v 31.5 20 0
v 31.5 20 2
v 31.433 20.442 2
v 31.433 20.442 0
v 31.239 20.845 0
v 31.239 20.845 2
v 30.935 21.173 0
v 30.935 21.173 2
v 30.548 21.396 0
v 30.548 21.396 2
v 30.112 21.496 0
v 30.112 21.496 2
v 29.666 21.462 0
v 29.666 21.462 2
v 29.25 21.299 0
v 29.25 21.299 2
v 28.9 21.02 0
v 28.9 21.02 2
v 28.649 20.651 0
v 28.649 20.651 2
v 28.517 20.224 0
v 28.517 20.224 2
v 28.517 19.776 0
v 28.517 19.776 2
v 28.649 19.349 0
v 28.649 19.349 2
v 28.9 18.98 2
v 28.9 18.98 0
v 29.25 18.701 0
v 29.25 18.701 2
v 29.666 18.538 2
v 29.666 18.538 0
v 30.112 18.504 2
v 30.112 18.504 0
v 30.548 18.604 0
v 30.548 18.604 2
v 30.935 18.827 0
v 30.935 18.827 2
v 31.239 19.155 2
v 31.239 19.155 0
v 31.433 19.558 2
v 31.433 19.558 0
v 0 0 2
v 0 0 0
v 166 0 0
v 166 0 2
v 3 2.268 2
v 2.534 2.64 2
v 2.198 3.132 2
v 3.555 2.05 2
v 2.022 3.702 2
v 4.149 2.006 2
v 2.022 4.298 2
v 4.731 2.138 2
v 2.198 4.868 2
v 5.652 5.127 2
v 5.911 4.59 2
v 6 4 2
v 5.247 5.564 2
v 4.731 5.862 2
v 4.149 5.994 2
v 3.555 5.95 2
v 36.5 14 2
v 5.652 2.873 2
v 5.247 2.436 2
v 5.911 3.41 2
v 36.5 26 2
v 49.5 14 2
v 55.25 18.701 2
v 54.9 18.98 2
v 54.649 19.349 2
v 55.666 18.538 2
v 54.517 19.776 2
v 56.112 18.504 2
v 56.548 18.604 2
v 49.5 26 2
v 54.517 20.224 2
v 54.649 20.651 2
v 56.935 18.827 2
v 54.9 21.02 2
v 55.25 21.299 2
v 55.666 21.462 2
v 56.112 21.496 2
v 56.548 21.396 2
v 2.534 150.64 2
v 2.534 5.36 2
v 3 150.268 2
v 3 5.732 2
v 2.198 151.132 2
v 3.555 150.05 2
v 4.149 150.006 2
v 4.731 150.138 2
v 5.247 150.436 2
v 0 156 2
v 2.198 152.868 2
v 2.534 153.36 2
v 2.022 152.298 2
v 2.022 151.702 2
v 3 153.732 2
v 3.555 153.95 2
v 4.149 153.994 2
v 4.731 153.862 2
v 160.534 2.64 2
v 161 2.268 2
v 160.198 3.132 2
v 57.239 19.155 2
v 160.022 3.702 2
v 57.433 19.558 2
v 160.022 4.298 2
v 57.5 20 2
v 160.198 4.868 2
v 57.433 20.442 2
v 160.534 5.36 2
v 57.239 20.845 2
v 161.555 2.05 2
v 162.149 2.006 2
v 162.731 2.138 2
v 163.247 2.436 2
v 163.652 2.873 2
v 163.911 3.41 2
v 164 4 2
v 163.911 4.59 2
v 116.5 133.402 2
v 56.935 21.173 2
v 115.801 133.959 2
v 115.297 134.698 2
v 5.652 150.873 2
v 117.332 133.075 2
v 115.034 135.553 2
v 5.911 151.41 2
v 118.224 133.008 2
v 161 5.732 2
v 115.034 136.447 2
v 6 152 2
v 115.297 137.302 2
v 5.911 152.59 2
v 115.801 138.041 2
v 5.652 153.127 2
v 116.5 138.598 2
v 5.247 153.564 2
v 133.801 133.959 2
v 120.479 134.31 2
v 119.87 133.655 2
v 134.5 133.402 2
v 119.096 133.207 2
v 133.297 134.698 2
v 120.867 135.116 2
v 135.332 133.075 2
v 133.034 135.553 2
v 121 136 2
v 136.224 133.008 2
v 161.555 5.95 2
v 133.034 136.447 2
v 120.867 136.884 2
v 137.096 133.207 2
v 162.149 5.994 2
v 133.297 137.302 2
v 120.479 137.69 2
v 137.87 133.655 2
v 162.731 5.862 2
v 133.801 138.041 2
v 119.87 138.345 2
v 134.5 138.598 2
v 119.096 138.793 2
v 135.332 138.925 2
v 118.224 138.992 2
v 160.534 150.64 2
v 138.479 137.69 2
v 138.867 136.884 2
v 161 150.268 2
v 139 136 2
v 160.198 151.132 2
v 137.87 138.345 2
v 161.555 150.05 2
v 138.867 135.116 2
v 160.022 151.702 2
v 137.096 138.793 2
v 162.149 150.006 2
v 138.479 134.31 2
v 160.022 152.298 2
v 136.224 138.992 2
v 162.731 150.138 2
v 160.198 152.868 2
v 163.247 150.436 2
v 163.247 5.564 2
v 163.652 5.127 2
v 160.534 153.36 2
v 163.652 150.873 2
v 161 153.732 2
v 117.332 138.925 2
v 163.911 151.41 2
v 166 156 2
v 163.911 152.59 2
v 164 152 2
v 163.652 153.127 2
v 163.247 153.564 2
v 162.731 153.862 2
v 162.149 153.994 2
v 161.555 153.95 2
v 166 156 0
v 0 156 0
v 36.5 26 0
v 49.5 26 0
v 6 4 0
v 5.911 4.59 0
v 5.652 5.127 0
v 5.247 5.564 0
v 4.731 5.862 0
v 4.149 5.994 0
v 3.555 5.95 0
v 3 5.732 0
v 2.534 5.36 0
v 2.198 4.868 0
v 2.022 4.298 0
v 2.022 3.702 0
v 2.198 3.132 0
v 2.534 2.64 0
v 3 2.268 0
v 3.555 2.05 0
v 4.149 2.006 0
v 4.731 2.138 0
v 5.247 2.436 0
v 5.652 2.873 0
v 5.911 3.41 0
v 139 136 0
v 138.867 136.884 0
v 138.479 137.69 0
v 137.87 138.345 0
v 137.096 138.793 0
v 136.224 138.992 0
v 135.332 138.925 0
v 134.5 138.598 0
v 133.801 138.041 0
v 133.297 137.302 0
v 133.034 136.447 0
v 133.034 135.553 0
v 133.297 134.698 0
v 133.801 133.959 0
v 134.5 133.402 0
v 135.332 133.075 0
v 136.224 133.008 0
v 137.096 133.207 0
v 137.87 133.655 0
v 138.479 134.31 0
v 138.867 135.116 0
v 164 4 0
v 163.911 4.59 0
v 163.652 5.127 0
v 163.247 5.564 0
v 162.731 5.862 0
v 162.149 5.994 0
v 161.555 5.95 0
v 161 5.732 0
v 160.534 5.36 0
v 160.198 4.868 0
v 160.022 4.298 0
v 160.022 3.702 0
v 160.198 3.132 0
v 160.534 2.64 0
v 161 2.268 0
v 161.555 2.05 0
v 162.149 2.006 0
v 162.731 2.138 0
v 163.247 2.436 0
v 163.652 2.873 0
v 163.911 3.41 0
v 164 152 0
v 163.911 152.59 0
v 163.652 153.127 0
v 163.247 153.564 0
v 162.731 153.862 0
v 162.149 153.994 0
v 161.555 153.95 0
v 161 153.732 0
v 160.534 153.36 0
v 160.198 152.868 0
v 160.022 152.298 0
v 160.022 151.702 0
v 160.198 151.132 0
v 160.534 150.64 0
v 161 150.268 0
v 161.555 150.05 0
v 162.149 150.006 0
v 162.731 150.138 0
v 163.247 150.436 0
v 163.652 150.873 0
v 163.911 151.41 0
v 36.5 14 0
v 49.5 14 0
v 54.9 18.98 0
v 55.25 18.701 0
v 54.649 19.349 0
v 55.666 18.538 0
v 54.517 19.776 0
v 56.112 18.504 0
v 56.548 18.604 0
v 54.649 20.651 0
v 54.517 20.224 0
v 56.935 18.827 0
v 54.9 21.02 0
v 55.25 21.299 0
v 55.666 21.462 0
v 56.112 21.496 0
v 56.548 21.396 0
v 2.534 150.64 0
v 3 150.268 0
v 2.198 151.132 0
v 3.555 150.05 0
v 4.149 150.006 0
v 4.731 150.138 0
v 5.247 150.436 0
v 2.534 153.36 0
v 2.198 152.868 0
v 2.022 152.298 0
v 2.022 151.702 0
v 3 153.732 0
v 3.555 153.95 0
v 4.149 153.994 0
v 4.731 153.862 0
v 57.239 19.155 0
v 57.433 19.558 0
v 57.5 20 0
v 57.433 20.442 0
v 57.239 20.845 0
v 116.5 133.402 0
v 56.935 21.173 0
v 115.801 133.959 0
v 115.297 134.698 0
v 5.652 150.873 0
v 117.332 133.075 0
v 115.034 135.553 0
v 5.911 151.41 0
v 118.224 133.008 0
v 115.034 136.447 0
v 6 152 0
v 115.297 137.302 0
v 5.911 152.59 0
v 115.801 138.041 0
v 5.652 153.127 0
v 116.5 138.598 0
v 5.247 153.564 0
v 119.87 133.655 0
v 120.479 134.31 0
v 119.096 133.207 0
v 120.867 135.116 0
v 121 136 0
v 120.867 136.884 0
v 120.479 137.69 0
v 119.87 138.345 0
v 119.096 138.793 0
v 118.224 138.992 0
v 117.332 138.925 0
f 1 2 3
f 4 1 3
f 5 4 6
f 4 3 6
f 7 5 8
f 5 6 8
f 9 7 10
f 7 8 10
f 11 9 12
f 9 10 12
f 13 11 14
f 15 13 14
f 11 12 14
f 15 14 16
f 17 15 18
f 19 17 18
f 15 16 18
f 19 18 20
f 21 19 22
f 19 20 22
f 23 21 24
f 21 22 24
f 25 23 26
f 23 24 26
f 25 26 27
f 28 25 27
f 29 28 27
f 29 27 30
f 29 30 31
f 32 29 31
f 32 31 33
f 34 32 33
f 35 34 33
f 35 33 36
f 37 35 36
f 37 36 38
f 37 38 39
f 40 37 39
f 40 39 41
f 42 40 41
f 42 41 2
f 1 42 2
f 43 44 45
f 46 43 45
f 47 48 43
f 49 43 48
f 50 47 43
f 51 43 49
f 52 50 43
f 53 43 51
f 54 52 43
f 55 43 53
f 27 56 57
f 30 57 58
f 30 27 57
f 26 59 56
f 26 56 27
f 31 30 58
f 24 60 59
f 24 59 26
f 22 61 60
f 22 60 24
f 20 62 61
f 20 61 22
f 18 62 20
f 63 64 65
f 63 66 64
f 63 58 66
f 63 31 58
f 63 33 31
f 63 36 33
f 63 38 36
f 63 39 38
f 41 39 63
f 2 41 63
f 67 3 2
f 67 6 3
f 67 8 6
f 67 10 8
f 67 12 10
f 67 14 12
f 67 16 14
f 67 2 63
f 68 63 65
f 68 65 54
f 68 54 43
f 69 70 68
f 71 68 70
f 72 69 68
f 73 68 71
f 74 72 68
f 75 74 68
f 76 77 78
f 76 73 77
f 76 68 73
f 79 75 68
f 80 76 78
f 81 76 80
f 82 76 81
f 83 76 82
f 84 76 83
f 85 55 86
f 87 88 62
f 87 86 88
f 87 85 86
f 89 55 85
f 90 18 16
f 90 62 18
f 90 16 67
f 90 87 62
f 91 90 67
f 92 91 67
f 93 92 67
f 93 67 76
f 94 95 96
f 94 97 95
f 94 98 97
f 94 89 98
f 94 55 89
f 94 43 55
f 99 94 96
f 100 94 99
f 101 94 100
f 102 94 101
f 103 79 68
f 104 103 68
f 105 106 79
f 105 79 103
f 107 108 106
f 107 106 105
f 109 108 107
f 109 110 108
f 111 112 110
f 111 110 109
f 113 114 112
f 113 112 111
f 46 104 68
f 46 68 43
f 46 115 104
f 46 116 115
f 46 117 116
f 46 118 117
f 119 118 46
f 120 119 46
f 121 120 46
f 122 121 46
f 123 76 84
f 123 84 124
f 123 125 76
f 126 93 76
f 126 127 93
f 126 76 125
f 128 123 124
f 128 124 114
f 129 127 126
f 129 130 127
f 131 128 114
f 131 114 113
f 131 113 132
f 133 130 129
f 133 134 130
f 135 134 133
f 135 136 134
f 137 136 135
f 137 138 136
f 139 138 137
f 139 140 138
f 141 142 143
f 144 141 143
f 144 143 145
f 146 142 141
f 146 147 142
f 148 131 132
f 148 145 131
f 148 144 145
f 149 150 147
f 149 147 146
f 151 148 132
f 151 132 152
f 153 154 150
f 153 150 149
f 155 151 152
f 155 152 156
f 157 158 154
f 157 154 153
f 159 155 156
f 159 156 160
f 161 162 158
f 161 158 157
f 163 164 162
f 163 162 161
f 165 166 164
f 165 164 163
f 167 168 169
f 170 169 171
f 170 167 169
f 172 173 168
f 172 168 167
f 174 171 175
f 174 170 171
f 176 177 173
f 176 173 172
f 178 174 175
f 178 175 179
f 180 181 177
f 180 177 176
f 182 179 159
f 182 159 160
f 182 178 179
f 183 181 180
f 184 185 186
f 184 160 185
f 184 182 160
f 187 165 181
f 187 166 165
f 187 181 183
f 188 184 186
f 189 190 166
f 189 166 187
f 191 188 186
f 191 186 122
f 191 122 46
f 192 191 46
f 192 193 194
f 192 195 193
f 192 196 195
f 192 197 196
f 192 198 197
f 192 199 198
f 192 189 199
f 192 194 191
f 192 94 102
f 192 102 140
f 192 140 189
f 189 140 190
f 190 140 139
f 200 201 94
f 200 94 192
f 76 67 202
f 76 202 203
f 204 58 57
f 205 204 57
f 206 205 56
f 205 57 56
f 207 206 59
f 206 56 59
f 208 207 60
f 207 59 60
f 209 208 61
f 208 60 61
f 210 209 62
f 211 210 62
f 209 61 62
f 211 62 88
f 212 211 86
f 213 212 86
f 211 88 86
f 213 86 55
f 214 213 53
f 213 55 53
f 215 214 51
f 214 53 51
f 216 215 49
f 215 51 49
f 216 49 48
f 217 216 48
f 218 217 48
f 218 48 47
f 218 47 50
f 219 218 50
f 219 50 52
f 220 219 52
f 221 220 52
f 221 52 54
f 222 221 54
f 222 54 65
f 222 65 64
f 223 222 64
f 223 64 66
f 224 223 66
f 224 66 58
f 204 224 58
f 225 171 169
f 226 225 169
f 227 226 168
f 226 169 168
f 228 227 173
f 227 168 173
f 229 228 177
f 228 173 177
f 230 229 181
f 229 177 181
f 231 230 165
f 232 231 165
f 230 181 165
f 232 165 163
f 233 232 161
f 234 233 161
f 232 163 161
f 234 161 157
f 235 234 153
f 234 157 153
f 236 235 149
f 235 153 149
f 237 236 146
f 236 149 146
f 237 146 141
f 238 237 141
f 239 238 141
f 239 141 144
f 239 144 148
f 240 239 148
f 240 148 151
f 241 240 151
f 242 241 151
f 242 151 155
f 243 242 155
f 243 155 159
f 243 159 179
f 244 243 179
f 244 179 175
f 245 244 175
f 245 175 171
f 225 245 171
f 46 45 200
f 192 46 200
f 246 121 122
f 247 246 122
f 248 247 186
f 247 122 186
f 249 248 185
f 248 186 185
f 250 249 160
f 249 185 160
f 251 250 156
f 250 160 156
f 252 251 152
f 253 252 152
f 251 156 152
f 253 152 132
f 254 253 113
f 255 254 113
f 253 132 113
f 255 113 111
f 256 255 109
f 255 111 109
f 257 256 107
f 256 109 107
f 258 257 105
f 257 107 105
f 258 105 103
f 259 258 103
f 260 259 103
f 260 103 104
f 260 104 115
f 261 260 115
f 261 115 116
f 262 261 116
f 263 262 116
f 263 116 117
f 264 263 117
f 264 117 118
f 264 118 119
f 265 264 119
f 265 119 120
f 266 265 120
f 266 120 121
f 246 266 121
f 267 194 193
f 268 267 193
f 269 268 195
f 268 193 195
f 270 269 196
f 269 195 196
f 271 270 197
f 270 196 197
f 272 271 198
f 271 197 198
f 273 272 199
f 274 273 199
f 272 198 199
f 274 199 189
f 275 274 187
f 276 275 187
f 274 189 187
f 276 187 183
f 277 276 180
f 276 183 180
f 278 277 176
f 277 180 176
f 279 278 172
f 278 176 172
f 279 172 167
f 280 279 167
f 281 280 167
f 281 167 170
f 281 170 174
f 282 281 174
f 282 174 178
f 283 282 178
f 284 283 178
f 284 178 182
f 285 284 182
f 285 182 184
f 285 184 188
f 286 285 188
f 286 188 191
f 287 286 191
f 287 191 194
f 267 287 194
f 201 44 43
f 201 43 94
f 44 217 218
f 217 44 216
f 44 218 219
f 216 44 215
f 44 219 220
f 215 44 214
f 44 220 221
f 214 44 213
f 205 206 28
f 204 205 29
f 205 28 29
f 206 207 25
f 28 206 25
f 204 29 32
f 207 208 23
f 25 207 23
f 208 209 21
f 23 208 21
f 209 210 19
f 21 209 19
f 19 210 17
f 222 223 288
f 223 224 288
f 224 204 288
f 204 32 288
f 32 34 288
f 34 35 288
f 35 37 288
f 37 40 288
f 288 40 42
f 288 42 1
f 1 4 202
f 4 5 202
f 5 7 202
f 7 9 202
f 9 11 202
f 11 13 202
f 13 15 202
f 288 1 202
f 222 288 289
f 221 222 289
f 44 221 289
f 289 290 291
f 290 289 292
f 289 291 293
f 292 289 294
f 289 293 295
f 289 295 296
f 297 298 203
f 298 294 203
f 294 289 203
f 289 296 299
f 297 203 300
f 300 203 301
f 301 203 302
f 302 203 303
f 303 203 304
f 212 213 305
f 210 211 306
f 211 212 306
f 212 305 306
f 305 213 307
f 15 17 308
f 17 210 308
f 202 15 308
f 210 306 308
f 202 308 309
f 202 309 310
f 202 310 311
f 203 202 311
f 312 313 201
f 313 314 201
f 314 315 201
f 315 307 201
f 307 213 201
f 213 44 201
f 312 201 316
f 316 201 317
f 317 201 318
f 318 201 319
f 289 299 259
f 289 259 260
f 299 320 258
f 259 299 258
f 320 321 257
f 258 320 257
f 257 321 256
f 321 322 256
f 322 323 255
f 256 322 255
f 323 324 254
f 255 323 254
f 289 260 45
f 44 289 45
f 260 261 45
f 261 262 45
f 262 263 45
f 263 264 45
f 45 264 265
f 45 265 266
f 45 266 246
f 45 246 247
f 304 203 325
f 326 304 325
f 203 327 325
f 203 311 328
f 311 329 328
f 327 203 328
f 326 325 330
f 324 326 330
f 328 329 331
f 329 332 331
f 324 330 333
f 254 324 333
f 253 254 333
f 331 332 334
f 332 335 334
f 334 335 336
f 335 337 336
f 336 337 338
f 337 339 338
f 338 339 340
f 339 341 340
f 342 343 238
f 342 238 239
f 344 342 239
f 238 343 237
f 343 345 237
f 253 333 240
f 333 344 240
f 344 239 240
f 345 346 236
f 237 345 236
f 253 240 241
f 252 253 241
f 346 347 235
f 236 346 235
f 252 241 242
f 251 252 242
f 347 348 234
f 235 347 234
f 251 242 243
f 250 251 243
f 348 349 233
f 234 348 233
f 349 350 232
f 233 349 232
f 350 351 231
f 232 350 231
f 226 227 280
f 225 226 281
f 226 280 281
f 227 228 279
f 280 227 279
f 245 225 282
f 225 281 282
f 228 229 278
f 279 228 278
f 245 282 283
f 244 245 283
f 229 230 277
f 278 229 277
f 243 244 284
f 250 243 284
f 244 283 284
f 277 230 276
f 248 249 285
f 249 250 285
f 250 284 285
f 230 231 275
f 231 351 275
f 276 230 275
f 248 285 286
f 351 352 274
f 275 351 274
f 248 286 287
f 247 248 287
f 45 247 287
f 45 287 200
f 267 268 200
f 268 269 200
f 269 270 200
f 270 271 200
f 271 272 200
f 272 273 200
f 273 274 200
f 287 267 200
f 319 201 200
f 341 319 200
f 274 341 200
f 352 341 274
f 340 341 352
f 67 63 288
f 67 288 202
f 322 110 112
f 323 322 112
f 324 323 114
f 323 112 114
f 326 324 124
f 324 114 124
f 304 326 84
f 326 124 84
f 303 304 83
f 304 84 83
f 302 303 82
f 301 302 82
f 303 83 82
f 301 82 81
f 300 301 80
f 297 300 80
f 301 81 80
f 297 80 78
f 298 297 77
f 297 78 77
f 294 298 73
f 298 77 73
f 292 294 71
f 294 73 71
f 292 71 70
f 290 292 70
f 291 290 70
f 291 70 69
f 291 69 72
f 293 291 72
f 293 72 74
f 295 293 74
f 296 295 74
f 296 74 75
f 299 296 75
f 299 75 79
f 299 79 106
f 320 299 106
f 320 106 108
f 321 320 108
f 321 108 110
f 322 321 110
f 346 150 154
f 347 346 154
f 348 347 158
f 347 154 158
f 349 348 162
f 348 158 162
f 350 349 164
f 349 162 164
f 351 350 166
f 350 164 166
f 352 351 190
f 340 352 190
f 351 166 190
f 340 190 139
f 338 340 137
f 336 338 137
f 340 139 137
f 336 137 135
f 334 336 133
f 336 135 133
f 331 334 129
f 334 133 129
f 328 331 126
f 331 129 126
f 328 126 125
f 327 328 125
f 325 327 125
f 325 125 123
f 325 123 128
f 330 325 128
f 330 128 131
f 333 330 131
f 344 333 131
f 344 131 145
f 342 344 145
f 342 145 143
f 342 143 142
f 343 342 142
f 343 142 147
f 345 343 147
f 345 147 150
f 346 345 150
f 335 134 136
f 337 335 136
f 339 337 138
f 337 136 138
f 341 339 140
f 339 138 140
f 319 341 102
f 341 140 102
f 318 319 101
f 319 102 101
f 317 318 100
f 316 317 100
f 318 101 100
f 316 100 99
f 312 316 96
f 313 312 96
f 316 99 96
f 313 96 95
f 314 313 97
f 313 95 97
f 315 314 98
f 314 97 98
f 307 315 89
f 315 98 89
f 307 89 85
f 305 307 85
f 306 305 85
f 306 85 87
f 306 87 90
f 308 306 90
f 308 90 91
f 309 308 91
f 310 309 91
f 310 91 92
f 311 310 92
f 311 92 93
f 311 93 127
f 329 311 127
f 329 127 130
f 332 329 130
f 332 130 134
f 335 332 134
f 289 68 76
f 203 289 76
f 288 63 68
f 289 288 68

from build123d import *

# Parameters (mm, degrees)
SKETCH_W        = 166
SKETCH_H        = 156
PAD_DEPTH       = 2
SKETCH001_R     = 2
POCKET_DEPTH    = 2.001
SKETCH002_R     = 3
POCKET001_DEPTH = 2.001
SKETCH003_R     = 1.5
SKETCH003_W     = 13
SKETCH003_H     = 12
POCKET002_DEPTH = 2.001


with BuildPart() as part:
    # Sketch → Pad (new body)
    with BuildSketch(Plane.XY):
        with Locations((83, 78)):
            Rectangle(SKETCH_W, SKETCH_H)
    extrude(amount=PAD_DEPTH)

    # Sketch001 (on Face6 of Pad) → Pocket (cut, through all)
    with BuildSketch(Plane.XY.offset(2)):
        with Locations((4, 152)):
            Circle(SKETCH001_R)
        with Locations((162, 152)):
            Circle(SKETCH001_R)
        with Locations((4, 4)):
            Circle(SKETCH001_R)
        with Locations((162, 4)):
            Circle(SKETCH001_R)
    extrude(amount=-POCKET_DEPTH, mode=Mode.SUBTRACT)

    # Sketch002 (on Face5 of Pocket) → Pocket001 (cut, through all)
    with BuildSketch(Plane.XY.offset(2)):
        with Locations((118, 136)):
            Circle(SKETCH002_R)
        with Locations((136, 136)):
            Circle(SKETCH002_R)
    extrude(amount=-POCKET001_DEPTH, mode=Mode.SUBTRACT)

    # Sketch003 (on Face5 of Pocket001) → Pocket002 (cut, through all)
    with BuildSketch(Plane.XY.offset(2)):
        with Locations((30, 20)):
            Circle(SKETCH003_R)
        with Locations((56, 20)):
            Circle(SKETCH003_R)
        with Locations((43, 20)):
            Rectangle(SKETCH003_W, SKETCH003_H)
    extrude(amount=-POCKET002_DEPTH, mode=Mode.SUBTRACT)


solid = part.part
